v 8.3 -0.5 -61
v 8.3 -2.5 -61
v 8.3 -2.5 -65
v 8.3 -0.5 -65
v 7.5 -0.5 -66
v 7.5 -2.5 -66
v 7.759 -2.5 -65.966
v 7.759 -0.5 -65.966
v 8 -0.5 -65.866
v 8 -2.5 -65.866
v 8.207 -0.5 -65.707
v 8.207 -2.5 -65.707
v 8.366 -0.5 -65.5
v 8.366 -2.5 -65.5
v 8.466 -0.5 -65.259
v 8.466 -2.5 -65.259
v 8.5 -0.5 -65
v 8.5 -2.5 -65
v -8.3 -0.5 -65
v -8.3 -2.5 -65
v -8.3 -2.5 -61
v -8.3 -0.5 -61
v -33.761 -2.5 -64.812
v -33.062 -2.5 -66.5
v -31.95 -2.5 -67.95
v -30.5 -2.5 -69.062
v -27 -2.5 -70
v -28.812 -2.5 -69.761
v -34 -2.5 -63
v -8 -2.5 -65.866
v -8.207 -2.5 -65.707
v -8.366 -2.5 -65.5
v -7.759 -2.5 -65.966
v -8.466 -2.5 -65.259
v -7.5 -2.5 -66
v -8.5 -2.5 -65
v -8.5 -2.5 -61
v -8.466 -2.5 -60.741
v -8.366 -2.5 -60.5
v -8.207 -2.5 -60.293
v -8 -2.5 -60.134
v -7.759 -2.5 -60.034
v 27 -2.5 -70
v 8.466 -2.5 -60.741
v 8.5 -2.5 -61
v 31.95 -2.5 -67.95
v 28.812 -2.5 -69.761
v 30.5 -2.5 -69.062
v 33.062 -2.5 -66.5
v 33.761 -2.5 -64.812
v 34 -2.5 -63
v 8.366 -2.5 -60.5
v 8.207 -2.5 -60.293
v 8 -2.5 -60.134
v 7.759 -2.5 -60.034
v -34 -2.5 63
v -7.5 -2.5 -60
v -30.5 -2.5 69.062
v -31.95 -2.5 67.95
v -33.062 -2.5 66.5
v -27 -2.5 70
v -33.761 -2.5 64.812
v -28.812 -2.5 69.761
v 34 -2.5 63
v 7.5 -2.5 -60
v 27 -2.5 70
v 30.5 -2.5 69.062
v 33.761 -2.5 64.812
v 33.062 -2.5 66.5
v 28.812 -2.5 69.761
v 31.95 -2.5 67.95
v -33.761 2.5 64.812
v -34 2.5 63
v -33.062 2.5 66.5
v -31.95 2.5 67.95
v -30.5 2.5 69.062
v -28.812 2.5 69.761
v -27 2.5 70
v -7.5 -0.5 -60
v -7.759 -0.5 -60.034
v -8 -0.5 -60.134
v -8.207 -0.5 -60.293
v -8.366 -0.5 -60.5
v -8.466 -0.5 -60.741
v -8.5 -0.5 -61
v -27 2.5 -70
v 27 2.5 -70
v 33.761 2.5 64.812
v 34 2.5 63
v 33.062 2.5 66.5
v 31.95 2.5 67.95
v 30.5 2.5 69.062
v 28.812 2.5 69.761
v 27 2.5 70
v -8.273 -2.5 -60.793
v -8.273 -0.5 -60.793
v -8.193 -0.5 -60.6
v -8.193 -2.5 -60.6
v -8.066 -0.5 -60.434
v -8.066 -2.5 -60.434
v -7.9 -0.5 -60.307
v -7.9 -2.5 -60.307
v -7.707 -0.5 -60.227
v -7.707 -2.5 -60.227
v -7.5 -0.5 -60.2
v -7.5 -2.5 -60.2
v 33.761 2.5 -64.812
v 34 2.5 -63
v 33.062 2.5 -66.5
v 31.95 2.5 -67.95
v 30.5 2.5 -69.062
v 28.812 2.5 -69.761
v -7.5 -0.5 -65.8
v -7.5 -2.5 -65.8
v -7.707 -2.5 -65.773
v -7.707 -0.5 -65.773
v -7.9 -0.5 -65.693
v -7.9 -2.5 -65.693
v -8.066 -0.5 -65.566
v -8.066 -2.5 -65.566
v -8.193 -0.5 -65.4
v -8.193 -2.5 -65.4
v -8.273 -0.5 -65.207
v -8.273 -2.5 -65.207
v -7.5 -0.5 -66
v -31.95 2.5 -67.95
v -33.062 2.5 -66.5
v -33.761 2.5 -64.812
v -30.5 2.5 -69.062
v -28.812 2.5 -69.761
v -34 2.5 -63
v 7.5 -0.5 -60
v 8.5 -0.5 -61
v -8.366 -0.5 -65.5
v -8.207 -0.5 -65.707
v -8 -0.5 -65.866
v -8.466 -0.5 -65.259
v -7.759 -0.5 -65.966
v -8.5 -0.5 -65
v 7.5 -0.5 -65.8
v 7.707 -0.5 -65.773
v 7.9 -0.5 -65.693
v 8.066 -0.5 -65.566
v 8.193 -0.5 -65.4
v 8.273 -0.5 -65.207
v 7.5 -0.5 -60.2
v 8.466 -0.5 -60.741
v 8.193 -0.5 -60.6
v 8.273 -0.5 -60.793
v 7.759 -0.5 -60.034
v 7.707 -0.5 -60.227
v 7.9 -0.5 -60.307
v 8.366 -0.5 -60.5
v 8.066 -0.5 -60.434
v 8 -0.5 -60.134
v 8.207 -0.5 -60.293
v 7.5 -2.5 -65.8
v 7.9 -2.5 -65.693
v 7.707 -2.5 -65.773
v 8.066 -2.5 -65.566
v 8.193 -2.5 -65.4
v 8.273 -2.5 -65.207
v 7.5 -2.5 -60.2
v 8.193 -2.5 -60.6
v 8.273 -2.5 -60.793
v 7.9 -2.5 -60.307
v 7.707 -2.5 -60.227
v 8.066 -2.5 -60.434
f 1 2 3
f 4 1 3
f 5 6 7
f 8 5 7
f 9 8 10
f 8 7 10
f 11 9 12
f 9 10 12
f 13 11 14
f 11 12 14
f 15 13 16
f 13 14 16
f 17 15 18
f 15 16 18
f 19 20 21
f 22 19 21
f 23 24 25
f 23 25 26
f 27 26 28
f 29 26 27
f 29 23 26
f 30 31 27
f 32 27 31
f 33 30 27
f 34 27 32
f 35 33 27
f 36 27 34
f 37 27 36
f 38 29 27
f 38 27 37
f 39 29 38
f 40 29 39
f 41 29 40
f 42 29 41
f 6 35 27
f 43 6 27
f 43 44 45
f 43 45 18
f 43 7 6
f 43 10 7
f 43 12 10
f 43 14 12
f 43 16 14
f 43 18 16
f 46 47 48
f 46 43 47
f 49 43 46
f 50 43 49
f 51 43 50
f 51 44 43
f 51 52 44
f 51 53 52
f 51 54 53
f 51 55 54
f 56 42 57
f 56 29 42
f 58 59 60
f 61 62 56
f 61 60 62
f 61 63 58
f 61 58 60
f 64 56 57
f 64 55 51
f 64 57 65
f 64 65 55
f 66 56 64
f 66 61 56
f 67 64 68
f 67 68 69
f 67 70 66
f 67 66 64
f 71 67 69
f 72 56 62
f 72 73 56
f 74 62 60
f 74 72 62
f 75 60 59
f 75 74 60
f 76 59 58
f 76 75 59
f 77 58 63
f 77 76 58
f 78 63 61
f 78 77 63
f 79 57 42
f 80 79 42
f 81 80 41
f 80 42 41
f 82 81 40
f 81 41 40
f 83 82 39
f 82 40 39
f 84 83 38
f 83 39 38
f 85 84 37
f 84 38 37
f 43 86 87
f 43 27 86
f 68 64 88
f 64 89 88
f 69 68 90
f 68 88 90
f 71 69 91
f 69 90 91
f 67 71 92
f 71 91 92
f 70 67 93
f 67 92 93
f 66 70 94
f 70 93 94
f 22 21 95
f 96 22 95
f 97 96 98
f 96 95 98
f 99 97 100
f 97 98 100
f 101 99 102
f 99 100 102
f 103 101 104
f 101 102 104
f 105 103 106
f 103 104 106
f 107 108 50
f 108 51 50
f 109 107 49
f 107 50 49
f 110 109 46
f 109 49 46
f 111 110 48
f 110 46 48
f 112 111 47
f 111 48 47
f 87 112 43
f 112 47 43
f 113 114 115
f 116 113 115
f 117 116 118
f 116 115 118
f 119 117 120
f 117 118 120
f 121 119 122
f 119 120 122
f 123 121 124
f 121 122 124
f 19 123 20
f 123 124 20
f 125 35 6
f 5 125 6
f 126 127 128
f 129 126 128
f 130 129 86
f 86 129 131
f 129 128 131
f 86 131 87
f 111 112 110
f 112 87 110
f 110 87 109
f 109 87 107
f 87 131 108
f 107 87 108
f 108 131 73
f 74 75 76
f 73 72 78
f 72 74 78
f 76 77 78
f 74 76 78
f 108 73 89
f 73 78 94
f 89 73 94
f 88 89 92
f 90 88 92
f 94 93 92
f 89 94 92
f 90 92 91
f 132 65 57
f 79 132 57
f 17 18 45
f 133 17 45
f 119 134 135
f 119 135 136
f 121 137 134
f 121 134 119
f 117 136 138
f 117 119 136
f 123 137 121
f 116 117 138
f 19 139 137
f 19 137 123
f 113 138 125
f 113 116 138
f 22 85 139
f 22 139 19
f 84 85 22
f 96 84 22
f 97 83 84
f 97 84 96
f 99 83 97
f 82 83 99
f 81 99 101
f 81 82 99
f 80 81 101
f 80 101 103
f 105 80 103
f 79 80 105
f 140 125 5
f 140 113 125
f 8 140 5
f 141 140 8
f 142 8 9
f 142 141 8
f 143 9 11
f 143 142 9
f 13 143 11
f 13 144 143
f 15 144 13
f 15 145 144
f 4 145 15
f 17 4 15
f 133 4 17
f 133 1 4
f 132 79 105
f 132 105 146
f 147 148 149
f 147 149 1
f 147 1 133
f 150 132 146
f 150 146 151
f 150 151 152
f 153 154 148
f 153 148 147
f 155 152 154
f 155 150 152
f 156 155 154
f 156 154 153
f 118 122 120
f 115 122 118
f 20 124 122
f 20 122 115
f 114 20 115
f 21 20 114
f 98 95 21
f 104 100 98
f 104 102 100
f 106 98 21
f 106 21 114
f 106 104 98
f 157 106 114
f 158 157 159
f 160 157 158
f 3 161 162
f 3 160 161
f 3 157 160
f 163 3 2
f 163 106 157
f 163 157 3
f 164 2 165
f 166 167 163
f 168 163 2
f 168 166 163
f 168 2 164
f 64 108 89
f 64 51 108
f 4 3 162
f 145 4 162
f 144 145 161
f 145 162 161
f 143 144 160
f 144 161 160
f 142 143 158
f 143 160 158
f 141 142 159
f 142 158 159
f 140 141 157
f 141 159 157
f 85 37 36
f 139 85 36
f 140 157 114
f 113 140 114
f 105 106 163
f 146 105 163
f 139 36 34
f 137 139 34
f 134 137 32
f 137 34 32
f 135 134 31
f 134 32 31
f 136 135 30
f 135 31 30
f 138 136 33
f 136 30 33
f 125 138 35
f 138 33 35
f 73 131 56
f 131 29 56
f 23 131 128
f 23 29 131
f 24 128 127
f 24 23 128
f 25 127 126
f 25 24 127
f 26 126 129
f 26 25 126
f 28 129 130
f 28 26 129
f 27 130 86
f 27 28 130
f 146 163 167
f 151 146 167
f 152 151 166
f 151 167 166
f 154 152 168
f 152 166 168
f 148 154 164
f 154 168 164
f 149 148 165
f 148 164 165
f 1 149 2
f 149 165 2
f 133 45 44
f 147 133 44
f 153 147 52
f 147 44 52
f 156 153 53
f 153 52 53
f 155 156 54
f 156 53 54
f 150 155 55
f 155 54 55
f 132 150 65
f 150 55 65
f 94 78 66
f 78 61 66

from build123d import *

# Parameters (mm, degrees)
F0_W     = 68
F0_H     = 140
F1_DEPTH = 2.5
F2_R     = 7
F4_DEPTH = 2


with BuildPart() as f1:
    # F0 (on Front) → F1 (new body, symmetric)
    with BuildSketch(Plane.XZ):
        Rectangle(F0_W, F0_H)
    extrude(amount=F1_DEPTH, both=True)

    # F2
    f2_edges = [f1.edges().sort_by_distance(p)[0] for p in [
        (34, 0, 70),
        (-34, 0, 70),
        (34, 0, -70),
        (-34, 0, -70),
    ]]
    fillet(f2_edges, radius=F2_R)

    # F3 (on face) → F4 (cut)
    with BuildSketch(Plane.XZ.offset(2.5)):
        with BuildLine():
            Line((7.5, -60), (-7.5, -60))
            ThreePointArc((-7.5, -60), (-8.207107, -60.292893), (-8.5, -61))
            Line((-8.5, -61), (-8.5, -65))
            ThreePointArc((-8.5, -65), (-8.207107, -65.707107), (-7.5, -66))
            Line((-7.5, -66), (7.5, -66))
            ThreePointArc((7.5, -66), (8.207107, -65.707107), (8.5, -65))
            Line((8.5, -65), (8.5, -61))
            ThreePointArc((8.5, -61), (8.207107, -60.292893), (7.5, -60))
        make_face()
        with BuildLine():
            ThreePointArc((-8.3, -61), (-8.065685, -60.434315), (-7.5, -60.2))
            Line((-7.5, -60.2), (7.5, -60.2))
            ThreePointArc((7.5, -60.2), (8.065685, -60.434315), (8.3, -61))
            Line((8.3, -61), (8.3, -65))
            ThreePointArc((8.3, -65), (8.065685, -65.565685), (7.5, -65.8))
            Line((7.5, -65.8), (-7.5, -65.8))
            ThreePointArc((-7.5, -65.8), (-8.065685, -65.565685), (-8.3, -65))
            Line((-8.3, -65), (-8.3, -61))
        make_face(mode=Mode.SUBTRACT)
    extrude(amount=-F4_DEPTH, mode=Mode.SUBTRACT)


solid = f1.part
